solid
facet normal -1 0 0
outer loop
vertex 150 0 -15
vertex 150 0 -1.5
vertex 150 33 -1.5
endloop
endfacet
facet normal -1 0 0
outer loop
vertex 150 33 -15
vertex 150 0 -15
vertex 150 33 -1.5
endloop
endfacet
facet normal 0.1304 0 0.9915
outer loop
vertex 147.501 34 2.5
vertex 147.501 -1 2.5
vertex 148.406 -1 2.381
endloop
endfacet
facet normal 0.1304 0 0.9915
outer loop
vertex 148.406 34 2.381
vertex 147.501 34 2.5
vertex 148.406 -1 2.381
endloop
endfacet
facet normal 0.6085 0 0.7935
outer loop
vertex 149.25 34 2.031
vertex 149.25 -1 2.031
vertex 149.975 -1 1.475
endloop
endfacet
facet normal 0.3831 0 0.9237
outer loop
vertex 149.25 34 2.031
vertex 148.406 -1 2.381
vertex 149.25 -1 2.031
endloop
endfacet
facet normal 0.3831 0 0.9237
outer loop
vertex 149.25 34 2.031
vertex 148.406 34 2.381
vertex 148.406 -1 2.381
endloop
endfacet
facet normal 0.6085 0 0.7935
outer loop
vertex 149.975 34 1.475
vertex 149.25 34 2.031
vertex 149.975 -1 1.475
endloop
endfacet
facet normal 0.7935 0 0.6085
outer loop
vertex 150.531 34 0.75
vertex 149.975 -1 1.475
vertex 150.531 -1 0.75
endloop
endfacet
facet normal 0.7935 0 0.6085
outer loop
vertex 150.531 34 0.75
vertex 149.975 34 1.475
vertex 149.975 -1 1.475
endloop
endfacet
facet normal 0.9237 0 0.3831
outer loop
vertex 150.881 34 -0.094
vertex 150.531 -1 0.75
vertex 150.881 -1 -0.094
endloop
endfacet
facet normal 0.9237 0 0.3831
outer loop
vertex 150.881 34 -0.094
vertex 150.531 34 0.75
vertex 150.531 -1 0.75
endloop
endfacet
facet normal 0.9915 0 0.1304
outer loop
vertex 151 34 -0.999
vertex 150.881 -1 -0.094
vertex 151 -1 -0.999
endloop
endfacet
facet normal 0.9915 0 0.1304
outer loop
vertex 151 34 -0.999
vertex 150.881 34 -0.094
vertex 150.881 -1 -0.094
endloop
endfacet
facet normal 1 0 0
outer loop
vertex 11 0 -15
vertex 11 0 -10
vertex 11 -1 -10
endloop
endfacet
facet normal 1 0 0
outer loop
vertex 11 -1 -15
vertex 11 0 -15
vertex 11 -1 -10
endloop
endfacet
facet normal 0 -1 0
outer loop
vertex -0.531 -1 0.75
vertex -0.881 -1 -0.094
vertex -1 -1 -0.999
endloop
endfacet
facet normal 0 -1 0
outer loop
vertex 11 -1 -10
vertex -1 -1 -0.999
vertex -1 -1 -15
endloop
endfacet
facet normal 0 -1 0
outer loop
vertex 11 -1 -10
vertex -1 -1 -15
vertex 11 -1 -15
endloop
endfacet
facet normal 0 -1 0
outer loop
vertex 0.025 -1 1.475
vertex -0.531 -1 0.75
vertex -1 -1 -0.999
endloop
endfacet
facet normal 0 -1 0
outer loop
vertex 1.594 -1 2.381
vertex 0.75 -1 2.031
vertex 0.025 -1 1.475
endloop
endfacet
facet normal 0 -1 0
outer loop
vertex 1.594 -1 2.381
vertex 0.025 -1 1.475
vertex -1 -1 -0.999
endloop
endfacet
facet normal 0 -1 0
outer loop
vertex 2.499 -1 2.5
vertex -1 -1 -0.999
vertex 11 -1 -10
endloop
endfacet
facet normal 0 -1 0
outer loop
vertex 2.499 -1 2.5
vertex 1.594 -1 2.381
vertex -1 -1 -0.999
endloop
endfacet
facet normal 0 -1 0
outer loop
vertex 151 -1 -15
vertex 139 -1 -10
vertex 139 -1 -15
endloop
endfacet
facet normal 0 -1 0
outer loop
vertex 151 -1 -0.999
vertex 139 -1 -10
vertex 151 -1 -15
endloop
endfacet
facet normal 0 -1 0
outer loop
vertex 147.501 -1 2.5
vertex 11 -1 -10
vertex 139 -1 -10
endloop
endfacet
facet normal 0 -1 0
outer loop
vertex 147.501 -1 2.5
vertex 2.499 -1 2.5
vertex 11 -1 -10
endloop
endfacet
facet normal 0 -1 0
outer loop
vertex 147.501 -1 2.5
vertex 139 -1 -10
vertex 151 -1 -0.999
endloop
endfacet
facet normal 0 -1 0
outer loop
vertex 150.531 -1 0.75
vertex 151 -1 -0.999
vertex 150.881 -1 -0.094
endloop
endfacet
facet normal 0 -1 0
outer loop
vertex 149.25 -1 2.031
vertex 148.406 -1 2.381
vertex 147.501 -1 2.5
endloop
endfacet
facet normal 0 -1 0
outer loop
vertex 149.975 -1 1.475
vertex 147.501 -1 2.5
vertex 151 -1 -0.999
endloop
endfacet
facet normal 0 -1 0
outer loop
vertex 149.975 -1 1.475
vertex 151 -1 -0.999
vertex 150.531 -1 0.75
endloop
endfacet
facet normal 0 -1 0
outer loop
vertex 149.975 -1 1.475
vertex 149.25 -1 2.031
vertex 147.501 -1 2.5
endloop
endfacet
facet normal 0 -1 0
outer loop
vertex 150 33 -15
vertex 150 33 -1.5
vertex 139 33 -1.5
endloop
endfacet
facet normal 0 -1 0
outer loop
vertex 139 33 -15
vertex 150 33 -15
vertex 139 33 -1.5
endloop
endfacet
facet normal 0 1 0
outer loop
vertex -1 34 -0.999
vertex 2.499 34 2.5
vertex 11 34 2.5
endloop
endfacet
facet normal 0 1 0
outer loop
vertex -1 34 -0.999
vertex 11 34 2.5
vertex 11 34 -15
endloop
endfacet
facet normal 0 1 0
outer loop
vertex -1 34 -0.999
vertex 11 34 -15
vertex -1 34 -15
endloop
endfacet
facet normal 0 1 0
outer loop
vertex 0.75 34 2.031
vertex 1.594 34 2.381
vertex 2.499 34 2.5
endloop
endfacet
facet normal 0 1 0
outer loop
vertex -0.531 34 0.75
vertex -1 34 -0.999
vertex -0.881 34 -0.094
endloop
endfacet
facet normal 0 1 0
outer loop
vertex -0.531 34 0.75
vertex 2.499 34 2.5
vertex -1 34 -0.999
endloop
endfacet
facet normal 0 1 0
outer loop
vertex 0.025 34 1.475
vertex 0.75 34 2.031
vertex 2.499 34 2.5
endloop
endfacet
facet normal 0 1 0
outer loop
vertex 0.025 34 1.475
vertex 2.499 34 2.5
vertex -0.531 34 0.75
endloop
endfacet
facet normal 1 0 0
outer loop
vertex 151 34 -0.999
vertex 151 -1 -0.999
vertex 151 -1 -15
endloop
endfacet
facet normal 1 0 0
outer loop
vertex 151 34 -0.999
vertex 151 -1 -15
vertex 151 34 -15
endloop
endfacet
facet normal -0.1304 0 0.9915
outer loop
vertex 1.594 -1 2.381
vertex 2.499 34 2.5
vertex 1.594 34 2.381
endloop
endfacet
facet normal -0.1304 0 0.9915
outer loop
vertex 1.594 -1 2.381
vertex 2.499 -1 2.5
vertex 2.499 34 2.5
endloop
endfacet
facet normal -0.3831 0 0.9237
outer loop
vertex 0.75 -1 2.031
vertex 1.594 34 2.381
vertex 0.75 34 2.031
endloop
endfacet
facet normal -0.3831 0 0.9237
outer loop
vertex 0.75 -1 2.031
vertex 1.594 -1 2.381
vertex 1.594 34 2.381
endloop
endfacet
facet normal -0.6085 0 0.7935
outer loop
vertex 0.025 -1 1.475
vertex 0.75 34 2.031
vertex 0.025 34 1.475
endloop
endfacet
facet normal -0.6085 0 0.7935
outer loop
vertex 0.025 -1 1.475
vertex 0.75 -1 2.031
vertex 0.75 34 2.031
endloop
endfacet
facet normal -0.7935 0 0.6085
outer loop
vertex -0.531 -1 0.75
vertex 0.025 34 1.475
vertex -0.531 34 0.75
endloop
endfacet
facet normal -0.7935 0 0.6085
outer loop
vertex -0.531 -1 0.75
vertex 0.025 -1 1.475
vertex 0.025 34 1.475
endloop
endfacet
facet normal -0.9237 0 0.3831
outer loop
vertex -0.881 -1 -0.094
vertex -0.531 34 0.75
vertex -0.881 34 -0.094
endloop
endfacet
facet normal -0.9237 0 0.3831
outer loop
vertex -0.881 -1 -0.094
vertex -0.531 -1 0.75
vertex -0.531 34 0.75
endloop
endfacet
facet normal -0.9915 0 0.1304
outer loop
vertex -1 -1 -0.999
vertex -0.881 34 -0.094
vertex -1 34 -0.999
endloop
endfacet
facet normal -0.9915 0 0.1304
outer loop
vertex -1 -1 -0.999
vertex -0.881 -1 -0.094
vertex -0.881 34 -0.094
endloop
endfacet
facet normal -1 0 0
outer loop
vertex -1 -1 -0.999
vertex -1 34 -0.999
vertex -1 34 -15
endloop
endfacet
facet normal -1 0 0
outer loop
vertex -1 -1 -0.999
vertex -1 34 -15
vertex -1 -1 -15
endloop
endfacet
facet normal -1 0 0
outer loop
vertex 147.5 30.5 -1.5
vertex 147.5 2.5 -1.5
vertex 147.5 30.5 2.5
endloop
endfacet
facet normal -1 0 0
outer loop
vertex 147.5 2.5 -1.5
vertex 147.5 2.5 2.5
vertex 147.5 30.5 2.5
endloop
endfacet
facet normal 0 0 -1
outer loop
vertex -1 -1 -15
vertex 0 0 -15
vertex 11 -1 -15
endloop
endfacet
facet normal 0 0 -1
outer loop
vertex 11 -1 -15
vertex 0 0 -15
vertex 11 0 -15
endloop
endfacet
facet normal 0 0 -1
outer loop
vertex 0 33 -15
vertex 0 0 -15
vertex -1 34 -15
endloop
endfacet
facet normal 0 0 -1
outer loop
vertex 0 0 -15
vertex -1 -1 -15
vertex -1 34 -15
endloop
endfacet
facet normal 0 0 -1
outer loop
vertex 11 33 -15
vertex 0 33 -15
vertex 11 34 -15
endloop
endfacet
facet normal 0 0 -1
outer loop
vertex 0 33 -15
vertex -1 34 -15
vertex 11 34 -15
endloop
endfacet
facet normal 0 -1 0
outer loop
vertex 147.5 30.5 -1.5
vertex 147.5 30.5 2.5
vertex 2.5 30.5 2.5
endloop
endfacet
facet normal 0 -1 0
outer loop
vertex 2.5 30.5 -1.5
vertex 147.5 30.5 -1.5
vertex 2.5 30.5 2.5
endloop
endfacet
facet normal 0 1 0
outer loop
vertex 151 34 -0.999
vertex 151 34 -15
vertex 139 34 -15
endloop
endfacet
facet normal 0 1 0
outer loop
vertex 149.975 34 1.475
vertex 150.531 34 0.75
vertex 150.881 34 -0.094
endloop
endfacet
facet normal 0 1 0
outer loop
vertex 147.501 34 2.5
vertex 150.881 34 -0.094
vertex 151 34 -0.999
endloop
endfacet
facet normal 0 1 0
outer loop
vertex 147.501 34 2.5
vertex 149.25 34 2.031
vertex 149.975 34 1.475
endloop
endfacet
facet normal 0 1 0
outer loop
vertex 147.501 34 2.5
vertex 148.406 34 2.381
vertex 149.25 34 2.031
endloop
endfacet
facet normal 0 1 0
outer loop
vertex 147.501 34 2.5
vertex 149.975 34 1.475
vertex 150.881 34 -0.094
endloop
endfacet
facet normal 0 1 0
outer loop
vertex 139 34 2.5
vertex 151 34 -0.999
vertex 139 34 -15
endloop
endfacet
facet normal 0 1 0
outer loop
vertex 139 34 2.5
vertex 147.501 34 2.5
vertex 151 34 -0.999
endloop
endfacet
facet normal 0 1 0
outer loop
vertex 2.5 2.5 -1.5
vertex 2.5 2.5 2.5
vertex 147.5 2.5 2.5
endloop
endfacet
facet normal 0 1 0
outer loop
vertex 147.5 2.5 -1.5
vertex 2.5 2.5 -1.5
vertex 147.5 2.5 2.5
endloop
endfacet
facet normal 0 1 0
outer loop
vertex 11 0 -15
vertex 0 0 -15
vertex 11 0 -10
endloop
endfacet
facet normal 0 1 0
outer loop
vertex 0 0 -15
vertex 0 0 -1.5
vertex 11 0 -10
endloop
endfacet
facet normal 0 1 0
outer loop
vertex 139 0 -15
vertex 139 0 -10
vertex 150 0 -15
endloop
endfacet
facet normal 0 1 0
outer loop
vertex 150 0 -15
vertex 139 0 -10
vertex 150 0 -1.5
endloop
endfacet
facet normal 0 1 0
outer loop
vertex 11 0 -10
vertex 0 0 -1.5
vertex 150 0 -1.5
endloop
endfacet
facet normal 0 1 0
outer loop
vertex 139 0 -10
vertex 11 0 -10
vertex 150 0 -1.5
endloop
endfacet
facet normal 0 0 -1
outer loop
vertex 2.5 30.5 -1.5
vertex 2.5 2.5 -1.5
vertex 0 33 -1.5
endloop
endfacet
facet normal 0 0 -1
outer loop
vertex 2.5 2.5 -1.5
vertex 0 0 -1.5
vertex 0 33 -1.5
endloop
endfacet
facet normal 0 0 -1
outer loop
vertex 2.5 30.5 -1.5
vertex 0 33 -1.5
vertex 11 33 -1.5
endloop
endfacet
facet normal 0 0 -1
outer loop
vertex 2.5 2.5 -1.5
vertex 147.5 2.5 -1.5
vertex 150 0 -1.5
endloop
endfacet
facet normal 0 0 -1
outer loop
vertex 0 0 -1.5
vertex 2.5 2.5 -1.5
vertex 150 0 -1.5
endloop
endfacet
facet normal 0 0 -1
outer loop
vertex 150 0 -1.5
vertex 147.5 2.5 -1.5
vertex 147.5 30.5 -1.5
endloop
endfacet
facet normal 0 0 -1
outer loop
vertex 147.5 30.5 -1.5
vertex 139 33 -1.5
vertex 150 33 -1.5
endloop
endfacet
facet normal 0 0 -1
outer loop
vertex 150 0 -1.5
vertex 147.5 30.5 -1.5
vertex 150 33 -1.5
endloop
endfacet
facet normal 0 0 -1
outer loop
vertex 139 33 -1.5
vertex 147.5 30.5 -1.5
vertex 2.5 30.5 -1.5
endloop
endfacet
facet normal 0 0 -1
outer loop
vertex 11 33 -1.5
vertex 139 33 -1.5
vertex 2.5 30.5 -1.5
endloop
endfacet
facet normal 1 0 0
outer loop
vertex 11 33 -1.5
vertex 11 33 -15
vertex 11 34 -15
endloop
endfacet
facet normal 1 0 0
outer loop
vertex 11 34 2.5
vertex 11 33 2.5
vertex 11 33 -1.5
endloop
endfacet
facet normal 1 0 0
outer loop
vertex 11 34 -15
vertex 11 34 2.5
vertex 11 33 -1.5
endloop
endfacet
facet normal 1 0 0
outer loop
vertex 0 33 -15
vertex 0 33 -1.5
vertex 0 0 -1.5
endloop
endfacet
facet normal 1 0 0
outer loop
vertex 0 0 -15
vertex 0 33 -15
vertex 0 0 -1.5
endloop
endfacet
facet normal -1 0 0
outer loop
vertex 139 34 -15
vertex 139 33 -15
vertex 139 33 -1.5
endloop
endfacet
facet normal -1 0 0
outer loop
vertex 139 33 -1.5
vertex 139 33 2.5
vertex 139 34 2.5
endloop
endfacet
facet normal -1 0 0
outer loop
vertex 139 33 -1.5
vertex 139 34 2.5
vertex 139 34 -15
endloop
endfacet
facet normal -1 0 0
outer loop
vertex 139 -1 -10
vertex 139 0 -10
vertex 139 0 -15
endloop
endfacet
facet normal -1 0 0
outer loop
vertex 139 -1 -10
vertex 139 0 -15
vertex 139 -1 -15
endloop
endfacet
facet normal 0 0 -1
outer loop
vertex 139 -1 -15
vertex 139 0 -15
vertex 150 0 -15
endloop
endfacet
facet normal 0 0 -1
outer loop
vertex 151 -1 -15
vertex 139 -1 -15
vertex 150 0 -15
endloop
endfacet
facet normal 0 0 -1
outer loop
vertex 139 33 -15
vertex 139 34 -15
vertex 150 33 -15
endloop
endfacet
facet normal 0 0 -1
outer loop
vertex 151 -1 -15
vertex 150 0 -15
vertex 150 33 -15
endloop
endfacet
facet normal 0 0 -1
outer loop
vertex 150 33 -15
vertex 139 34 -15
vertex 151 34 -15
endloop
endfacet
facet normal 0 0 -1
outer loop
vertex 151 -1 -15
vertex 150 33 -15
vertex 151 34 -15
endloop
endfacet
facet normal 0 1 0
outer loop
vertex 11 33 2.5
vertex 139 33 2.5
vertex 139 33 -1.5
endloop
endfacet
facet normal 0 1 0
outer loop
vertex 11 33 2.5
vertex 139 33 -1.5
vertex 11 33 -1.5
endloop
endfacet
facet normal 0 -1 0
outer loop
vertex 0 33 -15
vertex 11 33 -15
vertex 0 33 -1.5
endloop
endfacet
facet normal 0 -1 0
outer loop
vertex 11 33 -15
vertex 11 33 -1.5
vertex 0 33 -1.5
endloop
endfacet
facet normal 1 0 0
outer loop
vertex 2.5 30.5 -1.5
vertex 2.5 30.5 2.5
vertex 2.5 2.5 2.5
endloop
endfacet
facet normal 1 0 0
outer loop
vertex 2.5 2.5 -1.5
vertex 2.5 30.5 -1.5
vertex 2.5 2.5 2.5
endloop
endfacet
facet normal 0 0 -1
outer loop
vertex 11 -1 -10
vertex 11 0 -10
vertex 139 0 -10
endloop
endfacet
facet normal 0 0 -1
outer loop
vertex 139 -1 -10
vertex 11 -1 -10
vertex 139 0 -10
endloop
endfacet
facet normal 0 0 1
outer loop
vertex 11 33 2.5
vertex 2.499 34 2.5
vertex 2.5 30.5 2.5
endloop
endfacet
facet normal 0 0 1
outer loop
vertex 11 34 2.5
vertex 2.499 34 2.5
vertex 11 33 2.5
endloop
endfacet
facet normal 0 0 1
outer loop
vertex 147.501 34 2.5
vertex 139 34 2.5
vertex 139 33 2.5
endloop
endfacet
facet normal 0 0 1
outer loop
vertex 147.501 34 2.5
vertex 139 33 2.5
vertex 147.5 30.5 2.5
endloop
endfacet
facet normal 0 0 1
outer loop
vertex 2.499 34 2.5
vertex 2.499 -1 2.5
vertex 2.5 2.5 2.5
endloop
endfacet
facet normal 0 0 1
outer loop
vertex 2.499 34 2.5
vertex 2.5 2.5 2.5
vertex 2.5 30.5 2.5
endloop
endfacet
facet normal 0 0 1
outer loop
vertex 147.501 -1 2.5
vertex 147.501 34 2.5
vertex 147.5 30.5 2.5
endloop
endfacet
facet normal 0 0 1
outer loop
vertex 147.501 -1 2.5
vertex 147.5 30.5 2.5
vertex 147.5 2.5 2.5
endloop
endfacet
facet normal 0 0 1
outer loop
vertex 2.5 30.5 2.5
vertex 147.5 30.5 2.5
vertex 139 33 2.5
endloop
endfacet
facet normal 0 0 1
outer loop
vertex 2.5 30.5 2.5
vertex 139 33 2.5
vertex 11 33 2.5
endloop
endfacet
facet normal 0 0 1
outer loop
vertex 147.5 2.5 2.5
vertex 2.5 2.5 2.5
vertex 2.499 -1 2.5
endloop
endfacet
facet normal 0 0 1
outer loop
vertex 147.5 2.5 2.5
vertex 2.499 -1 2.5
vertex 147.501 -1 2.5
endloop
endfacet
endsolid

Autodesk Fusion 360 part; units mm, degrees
sketch "top" plane through (0, 0, 0) normal (0, 0, 1) x (1, 0, 0)
  line L0 (0, 0) -> (150, 0)
  line L1 (150, 0) -> (150, 33)
  line L2 (150, 33) -> (0, 33)
  line L3 (0, 33) -> (0, 0)
  line L4 (-1, -1) -> (151, -1)
  line L5 (151, -1) -> (151, 34)
  line L6 (151, 34) -> (-1, 34)
  line L7 (-1, 34) -> (-1, -1)
  line L8 (2.5, 2.5) -> (147.5, 2.5)
  line L9 (147.5, 2.5) -> (147.5, 30.5)
  line L10 (147.5, 30.5) -> (2.5, 30.5)
  line L11 (2.5, 30.5) -> (2.5, 2.5)
  line L12 (11, 30.5) -> (11, 34)
  line L13 (-1, 16.5) -> (151, 16.5) construction
  line L14 (75, 34) -> (75, -1) construction
  line L15 (139, 30.5) -> (139, 34)
  line L16 (11, 2.5) -> (11, -1)
  line L17 (139, 2.5) -> (139, -1)
  dimension "d4" = 150
  dimension "d5" = 33
  dimension "d6" = 1
  dimension "d7" = -2.5
  dimension "d8" = 12
extrude "Extrude1" add sketch "top" against normal blind 15 contours L0 L2 L3 L4 L6 L7 L12 L16 | L0 L1 L2 L4 L5 L6 L15 L17 makes body 1 at (-1, 22.3333, -5) makes body 2 at (151, 10.6667, -5)
extrude "Extrude2" add sketch "top" against normal blind 10 contours L0 L4 L16 L17 bodies 1 2
extrude "Extrude3" add sketch "top" against normal blind 1.5 contours L0 L2 L3 L8 L10 L11 L12 L16 | L0 L8 L16 L17 | L0 L1 L2 L8 L9 L10 L15 L17 | L2 L10 L12 L15 bodies 1
extrude "Extrude4" add sketch "top" along normal blind 2.5 contours L0 L2 L3 L8 L10 L11 L12 L16 | L0 L2 L3 L4 L6 L7 L12 L16 | L0 L8 L16 L17 | L0 L4 L16 L17 | L0 L1 L2 L8 L9 L10 L15 L17 | L0 L1 L2 L4 L5 L6 L15 L17 | L2 L10 L12 L15 bodies 1
fillet "Fillet1" radius 3.5 2 edges at (151, 16.5, 2.5) (-1, 16.5, 2.5) on bodies 1
